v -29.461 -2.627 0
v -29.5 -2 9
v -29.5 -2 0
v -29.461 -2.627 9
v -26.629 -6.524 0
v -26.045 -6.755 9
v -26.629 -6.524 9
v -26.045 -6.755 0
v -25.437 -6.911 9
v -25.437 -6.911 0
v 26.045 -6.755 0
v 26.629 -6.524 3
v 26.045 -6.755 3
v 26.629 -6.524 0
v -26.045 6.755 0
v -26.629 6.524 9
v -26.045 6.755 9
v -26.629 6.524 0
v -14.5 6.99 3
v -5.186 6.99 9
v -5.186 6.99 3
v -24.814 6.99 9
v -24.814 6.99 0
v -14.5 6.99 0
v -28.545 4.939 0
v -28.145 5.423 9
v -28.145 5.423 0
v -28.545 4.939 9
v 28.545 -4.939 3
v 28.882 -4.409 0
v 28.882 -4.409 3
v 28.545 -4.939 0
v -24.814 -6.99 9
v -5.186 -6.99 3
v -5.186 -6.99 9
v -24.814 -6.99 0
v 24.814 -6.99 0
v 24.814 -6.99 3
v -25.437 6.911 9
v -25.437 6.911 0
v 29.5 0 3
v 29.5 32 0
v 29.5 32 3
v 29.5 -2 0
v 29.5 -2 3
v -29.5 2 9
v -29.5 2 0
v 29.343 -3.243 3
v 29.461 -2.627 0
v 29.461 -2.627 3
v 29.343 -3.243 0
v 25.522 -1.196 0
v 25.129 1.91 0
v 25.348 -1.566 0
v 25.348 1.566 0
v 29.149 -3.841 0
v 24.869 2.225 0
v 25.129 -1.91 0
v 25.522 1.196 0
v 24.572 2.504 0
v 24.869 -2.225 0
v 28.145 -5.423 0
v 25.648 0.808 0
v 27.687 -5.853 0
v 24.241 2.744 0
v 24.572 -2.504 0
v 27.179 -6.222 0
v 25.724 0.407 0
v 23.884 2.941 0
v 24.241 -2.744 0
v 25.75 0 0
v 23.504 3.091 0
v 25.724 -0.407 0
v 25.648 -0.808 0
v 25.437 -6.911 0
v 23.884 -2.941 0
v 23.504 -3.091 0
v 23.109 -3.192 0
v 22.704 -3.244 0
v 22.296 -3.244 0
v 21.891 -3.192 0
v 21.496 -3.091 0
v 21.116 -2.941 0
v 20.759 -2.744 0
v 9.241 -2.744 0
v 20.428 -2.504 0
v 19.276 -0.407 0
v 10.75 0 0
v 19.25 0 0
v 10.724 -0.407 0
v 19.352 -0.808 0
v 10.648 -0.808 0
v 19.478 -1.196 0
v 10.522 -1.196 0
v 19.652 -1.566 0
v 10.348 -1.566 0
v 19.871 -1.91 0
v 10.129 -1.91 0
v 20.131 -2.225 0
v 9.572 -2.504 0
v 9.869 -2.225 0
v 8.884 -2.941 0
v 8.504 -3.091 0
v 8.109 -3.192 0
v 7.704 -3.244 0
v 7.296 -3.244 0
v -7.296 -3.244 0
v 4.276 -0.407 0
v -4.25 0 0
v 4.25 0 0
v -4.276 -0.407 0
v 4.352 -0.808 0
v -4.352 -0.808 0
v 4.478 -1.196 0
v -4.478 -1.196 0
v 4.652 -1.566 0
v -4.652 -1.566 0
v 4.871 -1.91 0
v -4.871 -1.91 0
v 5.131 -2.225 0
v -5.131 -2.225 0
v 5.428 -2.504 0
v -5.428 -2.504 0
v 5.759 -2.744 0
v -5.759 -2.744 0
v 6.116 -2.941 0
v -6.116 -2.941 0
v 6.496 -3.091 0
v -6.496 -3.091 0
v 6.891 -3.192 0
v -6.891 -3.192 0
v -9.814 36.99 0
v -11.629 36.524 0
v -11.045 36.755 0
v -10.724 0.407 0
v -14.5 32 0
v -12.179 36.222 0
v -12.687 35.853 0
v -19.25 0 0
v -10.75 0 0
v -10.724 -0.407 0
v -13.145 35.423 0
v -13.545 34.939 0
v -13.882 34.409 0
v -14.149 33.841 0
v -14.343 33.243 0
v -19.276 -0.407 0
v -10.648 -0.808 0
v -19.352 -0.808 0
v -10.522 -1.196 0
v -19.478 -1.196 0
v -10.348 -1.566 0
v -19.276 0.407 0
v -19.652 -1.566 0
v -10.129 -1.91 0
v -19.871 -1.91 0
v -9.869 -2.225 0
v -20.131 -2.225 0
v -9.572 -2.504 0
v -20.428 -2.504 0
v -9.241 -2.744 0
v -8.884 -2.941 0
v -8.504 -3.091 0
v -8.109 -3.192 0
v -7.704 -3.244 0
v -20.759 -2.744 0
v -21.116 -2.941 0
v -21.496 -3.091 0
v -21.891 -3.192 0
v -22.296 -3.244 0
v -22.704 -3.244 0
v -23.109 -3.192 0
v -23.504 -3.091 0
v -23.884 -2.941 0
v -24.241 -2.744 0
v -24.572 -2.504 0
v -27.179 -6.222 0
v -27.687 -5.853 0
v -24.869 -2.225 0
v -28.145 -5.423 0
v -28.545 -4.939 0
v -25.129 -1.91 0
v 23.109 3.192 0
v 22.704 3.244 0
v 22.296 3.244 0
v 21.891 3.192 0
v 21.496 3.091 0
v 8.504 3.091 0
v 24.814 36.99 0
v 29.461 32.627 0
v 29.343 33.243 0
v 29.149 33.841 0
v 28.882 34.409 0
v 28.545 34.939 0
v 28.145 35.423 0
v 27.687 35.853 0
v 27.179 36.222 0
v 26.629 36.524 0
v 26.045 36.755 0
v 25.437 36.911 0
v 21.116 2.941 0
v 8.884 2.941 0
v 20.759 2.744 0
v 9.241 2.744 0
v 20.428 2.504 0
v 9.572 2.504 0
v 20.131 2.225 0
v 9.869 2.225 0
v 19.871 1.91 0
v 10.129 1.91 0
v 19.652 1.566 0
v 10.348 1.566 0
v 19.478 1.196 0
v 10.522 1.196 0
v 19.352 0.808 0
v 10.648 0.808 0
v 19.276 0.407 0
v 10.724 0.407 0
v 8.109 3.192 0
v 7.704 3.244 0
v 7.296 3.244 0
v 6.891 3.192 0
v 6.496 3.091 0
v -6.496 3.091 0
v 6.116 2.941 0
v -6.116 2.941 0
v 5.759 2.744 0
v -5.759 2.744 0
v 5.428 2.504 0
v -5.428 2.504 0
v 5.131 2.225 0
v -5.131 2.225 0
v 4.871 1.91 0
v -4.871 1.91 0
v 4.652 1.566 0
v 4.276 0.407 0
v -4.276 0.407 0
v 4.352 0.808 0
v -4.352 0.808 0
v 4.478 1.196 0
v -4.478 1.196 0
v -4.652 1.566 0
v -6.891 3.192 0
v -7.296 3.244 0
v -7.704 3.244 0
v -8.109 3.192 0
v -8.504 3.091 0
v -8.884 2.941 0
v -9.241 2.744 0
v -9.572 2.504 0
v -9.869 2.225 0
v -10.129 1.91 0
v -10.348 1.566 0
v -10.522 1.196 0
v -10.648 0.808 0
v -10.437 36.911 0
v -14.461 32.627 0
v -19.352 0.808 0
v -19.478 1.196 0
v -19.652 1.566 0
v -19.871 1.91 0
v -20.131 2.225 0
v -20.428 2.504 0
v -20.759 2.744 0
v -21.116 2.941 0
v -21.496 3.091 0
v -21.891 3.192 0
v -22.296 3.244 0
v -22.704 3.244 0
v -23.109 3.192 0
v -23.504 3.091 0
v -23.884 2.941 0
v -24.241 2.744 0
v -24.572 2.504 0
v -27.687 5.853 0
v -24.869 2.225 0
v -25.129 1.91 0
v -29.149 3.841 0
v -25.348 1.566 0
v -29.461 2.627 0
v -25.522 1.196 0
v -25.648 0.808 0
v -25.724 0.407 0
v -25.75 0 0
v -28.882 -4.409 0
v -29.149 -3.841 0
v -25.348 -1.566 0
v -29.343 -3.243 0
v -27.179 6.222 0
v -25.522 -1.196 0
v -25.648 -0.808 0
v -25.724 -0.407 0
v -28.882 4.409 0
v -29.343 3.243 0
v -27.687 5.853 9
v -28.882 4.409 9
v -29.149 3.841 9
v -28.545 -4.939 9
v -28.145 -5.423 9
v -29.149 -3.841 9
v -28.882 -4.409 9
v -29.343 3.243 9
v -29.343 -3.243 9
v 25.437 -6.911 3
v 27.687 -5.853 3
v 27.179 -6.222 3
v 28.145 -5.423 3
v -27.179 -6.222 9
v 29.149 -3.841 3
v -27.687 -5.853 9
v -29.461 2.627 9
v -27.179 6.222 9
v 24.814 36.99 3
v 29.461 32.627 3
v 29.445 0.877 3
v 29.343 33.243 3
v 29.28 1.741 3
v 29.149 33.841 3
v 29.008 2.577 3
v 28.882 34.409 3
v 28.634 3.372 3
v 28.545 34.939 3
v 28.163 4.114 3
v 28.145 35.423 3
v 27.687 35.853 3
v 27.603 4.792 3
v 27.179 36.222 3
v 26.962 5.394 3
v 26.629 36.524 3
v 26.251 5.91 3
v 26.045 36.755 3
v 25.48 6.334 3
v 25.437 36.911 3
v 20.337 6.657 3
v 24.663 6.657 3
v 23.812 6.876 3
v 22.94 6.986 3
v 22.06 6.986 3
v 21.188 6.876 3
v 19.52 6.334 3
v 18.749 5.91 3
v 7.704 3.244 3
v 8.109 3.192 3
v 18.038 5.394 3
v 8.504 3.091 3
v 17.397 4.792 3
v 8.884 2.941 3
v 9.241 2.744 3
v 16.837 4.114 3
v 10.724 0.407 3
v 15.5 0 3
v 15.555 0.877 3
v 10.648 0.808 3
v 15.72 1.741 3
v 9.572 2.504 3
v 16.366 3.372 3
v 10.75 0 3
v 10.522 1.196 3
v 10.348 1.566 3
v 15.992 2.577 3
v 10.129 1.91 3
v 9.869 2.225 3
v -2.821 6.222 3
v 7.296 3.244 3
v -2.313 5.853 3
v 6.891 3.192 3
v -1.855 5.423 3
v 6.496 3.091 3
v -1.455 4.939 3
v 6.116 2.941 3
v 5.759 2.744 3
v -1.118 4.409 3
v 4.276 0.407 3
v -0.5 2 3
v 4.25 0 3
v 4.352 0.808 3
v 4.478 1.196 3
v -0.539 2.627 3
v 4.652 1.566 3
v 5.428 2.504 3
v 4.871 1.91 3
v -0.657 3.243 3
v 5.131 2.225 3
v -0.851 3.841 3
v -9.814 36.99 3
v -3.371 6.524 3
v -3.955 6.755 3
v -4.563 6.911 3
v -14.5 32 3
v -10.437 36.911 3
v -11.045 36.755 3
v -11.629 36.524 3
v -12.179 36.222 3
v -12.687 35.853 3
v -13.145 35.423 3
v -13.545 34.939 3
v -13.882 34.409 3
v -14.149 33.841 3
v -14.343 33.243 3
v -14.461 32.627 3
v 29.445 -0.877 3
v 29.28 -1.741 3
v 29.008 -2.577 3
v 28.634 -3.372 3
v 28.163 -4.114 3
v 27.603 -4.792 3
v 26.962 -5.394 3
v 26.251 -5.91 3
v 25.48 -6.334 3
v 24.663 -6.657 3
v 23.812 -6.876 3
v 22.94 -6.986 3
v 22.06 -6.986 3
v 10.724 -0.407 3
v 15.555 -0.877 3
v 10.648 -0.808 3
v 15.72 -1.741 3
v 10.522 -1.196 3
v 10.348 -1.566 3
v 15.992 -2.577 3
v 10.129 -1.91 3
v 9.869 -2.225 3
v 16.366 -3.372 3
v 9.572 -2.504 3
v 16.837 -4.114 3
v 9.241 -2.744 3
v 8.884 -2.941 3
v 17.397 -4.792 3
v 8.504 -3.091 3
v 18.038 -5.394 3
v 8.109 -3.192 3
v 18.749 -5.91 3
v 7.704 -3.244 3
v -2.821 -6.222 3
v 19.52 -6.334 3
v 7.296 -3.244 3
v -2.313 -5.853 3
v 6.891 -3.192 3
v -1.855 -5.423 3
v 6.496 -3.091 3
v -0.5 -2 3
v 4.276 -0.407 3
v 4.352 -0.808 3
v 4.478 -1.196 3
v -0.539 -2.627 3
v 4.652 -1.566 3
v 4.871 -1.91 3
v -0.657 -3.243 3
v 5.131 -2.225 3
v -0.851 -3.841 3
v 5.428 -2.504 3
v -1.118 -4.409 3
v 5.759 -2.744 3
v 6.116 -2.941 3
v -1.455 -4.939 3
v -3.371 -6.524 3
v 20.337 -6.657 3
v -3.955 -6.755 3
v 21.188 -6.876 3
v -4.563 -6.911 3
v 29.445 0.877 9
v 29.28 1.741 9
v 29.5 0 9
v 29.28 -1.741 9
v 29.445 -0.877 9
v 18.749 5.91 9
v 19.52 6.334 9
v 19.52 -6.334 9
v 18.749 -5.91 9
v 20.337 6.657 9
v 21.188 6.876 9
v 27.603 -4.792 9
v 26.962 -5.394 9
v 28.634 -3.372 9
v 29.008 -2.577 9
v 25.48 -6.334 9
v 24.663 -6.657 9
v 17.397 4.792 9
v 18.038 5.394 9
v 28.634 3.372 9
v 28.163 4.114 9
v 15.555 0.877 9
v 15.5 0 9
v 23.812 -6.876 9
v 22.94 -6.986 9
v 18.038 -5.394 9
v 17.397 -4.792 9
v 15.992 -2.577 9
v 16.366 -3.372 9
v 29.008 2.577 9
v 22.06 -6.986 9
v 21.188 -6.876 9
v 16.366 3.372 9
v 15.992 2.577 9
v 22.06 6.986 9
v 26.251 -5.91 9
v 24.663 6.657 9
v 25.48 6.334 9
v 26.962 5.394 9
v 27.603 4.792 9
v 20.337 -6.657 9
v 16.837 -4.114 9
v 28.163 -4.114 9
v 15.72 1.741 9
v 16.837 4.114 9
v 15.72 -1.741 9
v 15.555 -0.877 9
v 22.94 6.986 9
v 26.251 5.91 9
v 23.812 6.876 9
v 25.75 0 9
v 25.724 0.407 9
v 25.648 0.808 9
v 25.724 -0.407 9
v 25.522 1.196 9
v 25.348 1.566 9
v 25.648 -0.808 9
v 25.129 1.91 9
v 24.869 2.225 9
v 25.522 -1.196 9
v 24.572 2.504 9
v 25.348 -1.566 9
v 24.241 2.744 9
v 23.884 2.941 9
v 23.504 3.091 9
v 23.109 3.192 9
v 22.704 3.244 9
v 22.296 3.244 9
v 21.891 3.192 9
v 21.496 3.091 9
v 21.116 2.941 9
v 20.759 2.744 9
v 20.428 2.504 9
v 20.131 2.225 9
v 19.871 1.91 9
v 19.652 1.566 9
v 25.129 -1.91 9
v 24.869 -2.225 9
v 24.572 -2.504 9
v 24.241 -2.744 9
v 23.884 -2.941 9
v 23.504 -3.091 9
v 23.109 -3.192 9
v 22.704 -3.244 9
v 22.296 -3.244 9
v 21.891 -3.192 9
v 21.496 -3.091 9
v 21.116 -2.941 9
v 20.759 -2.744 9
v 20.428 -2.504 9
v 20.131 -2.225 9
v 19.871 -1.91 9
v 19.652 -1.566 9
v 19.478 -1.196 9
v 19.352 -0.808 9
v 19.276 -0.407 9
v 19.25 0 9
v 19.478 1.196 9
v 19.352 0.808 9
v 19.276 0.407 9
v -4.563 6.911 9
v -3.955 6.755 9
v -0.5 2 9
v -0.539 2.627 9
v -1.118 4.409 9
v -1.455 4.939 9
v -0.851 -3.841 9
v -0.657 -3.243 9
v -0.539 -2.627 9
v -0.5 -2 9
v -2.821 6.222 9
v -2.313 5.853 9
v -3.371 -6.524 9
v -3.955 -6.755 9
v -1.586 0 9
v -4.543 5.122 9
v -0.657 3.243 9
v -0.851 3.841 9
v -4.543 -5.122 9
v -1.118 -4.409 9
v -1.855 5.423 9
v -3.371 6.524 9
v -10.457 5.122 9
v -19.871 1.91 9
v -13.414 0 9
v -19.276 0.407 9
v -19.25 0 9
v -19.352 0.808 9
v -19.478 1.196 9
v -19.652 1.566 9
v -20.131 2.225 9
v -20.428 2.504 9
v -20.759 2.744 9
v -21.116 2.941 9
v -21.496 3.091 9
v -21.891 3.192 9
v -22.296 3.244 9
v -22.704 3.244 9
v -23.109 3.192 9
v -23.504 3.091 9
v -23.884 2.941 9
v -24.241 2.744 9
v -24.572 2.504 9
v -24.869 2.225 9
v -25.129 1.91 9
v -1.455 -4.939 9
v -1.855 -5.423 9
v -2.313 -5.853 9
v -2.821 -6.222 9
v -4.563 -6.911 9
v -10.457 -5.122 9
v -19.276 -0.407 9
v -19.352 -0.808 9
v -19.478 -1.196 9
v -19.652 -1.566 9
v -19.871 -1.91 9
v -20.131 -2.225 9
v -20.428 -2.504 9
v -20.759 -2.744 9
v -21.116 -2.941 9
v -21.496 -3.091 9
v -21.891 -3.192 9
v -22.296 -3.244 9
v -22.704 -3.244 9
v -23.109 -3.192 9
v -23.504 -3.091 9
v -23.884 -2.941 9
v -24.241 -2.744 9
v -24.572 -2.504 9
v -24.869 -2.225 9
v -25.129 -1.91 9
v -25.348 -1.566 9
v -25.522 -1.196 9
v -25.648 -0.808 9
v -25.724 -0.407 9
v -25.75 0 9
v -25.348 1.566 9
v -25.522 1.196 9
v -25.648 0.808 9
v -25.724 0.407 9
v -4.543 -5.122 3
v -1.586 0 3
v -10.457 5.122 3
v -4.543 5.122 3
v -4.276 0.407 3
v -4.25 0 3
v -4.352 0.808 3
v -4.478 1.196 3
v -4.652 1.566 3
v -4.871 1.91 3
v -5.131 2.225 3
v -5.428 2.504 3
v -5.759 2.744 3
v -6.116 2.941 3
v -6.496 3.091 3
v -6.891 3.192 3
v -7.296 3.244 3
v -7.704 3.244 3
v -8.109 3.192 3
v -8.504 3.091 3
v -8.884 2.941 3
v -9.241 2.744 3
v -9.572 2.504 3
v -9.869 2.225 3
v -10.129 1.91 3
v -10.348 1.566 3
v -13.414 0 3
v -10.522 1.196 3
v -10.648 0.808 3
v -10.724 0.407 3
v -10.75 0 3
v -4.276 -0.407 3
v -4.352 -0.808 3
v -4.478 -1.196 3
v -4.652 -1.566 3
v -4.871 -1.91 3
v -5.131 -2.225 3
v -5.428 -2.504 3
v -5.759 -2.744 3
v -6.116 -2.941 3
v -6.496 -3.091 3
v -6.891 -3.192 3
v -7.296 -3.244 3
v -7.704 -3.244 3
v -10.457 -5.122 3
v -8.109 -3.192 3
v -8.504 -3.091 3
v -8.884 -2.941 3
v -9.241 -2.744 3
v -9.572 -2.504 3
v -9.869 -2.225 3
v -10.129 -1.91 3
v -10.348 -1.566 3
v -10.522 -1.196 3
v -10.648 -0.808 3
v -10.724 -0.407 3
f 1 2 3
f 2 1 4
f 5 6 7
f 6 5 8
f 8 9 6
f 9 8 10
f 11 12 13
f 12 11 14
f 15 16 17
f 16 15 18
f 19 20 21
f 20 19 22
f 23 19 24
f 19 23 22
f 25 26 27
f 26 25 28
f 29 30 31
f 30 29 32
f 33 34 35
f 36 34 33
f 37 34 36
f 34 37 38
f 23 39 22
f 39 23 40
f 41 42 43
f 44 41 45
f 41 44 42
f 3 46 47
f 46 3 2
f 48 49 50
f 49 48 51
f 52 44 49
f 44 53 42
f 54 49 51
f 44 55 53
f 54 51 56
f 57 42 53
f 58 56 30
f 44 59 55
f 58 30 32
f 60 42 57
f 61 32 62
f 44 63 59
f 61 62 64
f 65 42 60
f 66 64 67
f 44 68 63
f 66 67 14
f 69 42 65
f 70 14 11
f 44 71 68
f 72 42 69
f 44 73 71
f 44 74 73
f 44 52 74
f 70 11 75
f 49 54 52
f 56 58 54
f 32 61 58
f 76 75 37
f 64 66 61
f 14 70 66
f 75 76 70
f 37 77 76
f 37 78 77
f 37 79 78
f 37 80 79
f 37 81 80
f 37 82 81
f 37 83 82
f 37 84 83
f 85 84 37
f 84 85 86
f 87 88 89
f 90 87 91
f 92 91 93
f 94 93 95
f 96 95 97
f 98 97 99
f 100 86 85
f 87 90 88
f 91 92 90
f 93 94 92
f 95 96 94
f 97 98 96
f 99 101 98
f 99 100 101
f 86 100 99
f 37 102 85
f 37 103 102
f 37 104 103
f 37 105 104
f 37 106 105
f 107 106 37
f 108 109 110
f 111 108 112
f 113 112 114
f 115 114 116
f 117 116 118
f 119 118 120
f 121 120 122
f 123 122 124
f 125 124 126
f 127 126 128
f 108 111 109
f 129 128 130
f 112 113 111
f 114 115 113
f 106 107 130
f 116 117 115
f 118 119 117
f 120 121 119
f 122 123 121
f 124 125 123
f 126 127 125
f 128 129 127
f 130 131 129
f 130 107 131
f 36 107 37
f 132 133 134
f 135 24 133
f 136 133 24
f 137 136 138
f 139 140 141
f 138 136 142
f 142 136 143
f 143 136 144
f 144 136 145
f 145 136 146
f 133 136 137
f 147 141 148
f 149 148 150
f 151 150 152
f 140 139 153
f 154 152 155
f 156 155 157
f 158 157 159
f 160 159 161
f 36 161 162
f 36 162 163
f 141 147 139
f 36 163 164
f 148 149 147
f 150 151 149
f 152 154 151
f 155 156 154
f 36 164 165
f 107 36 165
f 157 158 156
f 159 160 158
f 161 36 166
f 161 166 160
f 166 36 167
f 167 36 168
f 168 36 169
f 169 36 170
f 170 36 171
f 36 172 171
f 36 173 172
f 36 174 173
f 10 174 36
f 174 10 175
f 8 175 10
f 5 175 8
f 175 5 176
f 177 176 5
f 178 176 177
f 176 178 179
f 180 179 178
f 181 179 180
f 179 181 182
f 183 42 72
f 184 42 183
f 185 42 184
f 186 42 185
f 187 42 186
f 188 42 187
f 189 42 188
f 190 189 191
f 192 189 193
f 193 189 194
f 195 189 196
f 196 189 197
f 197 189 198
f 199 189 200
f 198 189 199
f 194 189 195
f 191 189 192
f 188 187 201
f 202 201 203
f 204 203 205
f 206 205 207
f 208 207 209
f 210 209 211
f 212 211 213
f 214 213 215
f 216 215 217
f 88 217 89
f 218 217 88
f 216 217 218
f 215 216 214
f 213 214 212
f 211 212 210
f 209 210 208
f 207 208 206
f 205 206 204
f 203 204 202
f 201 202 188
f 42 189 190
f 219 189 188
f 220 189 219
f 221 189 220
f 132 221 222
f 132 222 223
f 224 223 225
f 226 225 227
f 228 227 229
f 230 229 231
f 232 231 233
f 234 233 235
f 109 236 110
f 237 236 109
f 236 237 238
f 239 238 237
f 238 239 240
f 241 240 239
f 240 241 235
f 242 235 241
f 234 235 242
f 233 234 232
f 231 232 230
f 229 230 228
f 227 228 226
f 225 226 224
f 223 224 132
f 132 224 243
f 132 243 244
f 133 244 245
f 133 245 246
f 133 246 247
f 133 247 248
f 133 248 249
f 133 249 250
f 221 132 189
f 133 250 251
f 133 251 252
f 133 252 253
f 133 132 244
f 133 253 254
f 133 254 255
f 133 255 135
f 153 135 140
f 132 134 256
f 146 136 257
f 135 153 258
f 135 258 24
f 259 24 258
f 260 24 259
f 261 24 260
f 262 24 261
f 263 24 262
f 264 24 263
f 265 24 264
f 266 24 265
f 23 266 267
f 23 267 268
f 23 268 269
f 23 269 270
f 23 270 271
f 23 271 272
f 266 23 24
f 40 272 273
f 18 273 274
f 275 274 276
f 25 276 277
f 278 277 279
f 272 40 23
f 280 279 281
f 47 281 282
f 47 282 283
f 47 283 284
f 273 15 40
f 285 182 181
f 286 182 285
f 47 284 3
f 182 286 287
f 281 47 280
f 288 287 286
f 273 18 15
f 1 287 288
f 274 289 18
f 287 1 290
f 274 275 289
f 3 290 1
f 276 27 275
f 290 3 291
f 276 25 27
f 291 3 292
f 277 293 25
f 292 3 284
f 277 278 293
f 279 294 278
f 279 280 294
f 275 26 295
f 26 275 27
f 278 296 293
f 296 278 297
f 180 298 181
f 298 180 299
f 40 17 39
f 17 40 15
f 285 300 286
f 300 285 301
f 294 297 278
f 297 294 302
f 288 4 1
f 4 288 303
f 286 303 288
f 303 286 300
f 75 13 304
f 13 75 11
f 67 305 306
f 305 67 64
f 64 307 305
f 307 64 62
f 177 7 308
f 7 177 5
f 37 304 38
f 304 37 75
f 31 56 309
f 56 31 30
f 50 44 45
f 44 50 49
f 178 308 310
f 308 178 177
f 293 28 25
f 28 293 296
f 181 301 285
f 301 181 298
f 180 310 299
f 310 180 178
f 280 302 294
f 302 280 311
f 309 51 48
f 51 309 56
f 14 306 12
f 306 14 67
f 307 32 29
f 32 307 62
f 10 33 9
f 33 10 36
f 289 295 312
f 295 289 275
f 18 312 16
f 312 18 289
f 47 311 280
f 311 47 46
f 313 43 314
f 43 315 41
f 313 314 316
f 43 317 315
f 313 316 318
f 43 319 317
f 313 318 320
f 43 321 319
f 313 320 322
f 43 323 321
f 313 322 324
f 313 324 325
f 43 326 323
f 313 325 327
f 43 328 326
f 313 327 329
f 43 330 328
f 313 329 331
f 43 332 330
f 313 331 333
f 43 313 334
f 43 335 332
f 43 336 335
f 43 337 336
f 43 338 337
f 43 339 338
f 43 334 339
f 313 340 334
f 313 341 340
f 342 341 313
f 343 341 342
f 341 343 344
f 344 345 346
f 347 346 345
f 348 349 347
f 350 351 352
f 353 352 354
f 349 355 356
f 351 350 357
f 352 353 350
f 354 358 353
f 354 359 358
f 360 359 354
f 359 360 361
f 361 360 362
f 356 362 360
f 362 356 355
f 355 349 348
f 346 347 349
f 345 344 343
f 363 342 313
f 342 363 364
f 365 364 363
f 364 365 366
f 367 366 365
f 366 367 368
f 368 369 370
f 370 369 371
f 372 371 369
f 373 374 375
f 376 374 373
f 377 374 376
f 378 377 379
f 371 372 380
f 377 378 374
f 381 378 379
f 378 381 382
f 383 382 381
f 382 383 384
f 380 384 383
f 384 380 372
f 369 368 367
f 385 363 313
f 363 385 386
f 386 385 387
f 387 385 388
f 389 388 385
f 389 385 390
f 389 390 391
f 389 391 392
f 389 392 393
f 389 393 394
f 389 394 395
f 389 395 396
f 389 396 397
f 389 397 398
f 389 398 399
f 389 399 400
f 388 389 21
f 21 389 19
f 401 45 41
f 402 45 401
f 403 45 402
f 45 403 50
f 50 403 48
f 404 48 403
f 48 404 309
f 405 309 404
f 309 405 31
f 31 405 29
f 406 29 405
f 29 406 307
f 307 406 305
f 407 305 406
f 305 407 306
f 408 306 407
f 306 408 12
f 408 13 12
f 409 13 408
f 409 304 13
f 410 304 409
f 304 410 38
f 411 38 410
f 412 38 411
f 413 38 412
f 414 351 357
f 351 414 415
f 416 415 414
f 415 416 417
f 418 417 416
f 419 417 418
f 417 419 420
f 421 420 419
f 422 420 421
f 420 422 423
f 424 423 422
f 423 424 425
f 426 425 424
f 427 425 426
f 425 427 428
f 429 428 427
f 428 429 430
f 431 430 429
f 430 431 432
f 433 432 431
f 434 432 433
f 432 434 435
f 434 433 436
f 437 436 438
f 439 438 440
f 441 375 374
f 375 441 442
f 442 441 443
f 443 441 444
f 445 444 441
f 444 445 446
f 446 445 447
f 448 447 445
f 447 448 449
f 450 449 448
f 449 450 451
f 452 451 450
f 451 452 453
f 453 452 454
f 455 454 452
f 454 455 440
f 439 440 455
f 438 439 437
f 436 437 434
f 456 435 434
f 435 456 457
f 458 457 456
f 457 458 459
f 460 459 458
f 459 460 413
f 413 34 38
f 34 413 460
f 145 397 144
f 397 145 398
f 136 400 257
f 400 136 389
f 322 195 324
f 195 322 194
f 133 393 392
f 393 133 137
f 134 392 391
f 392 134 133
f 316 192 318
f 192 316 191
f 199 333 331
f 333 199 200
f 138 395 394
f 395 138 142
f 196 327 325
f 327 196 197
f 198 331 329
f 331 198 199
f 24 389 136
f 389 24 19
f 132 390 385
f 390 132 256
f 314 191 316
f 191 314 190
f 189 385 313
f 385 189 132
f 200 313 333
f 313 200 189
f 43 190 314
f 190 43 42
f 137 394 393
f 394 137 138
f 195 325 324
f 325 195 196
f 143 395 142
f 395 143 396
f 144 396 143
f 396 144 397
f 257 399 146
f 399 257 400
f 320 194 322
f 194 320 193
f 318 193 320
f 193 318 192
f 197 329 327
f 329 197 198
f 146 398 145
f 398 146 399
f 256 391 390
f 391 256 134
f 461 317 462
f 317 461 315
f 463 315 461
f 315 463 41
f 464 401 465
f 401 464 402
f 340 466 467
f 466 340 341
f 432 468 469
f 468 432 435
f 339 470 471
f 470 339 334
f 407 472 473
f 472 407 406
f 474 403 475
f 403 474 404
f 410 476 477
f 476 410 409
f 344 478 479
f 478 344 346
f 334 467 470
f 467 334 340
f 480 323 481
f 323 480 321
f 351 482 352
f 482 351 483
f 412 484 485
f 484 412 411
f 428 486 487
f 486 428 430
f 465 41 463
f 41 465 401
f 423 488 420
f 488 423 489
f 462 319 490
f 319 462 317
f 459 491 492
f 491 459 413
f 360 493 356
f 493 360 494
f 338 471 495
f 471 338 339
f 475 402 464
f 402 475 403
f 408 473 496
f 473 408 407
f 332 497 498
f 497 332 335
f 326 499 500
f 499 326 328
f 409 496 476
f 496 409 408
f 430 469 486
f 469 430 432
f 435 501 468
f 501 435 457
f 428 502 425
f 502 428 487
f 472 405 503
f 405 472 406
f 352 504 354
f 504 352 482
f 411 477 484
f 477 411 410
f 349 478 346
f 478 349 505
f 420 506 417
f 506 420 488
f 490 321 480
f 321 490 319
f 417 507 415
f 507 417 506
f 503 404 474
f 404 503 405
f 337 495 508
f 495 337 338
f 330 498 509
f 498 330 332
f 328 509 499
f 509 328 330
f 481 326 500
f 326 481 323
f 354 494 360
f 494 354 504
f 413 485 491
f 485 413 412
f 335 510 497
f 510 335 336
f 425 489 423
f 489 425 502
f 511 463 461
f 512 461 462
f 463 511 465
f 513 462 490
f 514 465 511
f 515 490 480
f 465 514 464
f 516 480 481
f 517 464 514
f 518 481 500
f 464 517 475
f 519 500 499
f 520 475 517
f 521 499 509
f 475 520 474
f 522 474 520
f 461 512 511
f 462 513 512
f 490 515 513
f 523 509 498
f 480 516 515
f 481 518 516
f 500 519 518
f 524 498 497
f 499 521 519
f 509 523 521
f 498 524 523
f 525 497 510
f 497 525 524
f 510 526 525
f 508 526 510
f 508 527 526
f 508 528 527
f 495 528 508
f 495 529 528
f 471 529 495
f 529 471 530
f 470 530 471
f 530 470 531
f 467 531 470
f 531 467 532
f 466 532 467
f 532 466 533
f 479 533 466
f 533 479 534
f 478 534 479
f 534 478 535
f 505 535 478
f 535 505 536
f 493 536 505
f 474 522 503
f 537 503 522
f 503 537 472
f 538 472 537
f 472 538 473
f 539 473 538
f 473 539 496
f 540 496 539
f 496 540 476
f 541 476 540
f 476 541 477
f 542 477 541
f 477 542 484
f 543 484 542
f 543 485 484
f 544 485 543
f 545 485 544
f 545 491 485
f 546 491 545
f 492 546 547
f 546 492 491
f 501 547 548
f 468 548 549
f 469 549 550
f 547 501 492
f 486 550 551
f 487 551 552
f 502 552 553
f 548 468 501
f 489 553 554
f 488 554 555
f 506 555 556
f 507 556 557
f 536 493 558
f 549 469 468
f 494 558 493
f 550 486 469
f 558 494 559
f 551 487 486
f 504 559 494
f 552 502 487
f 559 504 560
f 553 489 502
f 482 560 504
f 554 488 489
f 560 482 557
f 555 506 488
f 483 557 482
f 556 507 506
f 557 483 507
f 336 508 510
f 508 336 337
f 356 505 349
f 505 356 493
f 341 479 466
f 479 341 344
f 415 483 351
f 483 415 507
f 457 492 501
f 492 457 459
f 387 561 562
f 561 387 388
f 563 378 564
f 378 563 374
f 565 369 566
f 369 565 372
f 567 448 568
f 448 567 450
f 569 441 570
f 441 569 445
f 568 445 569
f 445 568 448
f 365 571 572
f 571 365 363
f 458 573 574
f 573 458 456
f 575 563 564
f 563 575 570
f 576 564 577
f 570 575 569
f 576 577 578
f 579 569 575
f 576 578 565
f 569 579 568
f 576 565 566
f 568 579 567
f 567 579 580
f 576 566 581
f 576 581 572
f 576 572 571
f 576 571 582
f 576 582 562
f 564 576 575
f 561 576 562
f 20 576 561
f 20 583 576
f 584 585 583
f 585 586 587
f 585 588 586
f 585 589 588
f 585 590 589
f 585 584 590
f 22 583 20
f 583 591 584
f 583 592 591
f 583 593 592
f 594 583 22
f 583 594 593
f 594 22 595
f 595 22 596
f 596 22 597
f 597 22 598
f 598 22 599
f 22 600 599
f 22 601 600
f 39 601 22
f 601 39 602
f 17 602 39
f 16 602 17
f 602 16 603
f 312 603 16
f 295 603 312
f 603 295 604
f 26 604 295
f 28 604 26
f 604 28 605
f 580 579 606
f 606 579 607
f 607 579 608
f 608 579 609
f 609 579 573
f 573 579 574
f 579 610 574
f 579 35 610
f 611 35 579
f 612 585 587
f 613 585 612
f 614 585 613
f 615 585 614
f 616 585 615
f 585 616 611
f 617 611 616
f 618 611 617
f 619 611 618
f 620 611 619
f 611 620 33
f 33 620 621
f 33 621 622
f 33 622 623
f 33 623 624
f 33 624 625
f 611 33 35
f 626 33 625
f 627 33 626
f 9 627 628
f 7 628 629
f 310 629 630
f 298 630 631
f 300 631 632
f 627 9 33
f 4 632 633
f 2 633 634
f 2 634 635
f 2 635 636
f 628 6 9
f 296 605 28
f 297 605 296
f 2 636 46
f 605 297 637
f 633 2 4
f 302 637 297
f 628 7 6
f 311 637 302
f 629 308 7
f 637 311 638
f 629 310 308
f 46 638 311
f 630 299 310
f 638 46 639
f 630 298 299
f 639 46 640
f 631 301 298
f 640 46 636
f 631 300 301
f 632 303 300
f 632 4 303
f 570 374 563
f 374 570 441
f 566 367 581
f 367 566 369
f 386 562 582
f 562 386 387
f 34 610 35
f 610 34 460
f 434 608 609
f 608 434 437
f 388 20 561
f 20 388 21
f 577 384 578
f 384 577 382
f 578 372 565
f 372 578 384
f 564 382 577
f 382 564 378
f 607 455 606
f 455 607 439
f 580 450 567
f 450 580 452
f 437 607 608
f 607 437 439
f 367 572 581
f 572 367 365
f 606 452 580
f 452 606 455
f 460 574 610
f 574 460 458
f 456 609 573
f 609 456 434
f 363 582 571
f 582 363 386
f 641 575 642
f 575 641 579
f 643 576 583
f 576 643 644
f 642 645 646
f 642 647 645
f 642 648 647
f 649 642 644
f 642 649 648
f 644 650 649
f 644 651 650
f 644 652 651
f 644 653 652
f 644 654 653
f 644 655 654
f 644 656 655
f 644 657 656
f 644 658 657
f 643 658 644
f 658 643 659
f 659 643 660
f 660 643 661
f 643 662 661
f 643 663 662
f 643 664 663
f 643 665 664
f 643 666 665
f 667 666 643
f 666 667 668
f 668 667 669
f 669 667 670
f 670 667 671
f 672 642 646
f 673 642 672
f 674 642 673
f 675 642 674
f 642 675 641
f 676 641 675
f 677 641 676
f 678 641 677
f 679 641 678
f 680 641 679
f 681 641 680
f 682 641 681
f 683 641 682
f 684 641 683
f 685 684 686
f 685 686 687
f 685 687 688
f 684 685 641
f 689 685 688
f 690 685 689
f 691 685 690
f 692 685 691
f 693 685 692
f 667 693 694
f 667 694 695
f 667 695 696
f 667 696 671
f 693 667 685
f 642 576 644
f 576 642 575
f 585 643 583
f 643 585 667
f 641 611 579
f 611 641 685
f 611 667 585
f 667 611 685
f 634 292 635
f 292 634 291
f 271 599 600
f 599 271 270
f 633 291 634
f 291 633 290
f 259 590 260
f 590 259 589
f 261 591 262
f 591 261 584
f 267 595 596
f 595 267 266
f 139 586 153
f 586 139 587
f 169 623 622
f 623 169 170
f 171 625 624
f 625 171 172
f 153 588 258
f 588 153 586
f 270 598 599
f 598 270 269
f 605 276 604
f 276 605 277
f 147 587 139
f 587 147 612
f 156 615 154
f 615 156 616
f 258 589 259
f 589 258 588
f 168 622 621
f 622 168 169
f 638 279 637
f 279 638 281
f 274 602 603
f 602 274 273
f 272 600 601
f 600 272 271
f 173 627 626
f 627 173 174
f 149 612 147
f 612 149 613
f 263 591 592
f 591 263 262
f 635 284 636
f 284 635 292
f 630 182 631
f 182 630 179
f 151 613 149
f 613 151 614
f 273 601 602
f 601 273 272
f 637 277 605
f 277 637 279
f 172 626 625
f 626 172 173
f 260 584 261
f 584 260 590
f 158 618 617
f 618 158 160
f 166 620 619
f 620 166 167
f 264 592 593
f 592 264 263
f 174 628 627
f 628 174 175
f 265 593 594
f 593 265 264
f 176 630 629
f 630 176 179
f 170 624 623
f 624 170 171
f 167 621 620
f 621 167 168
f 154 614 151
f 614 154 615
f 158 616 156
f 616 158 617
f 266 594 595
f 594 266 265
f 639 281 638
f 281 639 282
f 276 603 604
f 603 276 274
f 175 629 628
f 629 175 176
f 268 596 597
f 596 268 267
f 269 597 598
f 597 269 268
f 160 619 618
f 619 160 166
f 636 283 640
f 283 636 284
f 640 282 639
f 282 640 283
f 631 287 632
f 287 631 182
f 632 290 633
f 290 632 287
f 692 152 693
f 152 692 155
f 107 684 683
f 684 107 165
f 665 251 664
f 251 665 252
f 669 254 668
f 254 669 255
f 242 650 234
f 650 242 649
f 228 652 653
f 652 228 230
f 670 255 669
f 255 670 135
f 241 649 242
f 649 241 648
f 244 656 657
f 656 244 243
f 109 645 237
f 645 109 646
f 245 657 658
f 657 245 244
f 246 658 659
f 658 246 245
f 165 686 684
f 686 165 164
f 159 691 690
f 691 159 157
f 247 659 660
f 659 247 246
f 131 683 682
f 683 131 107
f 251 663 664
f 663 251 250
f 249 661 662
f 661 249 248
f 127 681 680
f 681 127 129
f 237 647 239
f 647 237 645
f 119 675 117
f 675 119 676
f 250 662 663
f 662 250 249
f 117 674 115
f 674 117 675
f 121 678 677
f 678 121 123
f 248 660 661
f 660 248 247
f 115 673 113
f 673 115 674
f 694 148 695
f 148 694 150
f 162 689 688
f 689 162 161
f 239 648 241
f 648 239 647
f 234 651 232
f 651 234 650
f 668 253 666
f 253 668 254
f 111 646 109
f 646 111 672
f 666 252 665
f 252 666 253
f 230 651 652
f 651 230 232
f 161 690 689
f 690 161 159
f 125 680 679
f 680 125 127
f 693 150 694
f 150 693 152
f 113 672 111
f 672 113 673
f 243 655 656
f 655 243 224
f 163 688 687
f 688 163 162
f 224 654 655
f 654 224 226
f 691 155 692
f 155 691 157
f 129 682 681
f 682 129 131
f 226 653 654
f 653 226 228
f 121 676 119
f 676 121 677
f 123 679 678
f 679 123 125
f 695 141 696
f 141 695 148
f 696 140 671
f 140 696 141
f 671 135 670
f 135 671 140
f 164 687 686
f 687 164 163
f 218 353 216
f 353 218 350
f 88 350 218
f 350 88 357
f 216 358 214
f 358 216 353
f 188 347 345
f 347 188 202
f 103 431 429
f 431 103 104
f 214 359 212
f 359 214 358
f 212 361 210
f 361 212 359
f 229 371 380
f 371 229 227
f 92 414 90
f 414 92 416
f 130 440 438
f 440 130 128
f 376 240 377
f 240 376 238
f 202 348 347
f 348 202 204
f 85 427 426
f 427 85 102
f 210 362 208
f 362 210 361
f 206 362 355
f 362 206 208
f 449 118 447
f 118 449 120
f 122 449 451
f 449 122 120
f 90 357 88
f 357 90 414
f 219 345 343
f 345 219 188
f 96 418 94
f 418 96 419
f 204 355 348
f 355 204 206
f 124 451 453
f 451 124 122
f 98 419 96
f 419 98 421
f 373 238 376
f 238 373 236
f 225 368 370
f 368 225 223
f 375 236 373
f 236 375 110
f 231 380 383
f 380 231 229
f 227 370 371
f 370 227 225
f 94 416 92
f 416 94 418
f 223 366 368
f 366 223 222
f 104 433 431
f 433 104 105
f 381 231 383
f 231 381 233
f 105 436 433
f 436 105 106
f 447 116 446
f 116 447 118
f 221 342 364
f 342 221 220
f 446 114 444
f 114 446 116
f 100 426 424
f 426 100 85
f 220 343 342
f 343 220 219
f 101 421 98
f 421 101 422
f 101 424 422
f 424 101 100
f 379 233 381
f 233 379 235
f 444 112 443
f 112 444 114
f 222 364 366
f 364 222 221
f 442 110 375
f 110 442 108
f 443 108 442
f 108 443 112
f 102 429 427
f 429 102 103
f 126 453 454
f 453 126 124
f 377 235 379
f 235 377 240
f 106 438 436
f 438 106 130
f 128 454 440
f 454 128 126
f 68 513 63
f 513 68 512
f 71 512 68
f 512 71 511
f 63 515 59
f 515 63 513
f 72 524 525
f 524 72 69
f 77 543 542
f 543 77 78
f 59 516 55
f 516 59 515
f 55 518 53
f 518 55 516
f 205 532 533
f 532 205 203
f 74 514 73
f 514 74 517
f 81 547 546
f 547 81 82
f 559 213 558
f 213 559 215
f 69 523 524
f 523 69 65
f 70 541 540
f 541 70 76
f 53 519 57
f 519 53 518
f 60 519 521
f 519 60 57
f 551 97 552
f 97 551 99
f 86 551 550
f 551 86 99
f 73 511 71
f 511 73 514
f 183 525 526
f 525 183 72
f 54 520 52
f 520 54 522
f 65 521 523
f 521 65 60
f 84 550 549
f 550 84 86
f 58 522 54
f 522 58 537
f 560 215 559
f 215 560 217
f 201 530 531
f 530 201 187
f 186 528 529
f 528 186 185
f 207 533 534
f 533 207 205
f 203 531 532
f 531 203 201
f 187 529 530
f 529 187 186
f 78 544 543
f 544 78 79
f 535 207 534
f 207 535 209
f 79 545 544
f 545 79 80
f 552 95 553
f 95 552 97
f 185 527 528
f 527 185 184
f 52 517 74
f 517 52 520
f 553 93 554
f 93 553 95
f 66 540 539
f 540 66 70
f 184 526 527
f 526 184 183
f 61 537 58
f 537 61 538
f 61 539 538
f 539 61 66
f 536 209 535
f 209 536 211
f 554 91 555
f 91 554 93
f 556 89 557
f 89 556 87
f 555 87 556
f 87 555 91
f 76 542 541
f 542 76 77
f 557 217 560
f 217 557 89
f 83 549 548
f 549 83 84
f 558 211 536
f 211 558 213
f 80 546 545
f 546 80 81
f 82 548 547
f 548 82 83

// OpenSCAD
$fn = 50;


difference() {
	union() {
		hull() {
			translate(v = [-24.5000000000, 2.0000000000, 0]) {
				cylinder(h = 3, r = 5);
			}
			translate(v = [24.5000000000, 2.0000000000, 0]) {
				cylinder(h = 3, r = 5);
			}
			translate(v = [-24.5000000000, -2.0000000000, 0]) {
				cylinder(h = 3, r = 5);
			}
			translate(v = [24.5000000000, -2.0000000000, 0]) {
				cylinder(h = 3, r = 5);
			}
		}
		translate(v = [7.5000000000, 15.0000000000, 0]) {
			hull() {
				translate(v = [-17.0000000000, 17.0000000000, 0]) {
					cylinder(h = 3, r = 5);
				}
				translate(v = [17.0000000000, 17.0000000000, 0]) {
					cylinder(h = 3, r = 5);
				}
				translate(v = [-17.0000000000, -17.0000000000, 0]) {
					cylinder(h = 3, r = 5);
				}
				translate(v = [17.0000000000, -17.0000000000, 0]) {
					cylinder(h = 3, r = 5);
				}
			}
		}
		translate(v = [22.5000000000, 0, 0]) {
			cylinder(h = 9, r = 7.0000000000);
		}
		translate(v = [-15.0000000000, 0, 0]) {
			hull() {
				translate(v = [-9.5000000000, 2.0000000000, 0]) {
					cylinder(h = 9, r = 5);
				}
				translate(v = [9.5000000000, 2.0000000000, 0]) {
					cylinder(h = 9, r = 5);
				}
				translate(v = [-9.5000000000, -2.0000000000, 0]) {
					cylinder(h = 9, r = 5);
				}
				translate(v = [9.5000000000, -2.0000000000, 0]) {
					cylinder(h = 9, r = 5);
				}
			}
		}
	}
	union() {
		translate(v = [-7.5000000000, 0, 9]) {
			rotate(a = [0, 0, 0]) {
				difference() {
					union() {
						translate(v = [0, 0, -6]) {
							linear_extrude(height = 6) {
								polygon(points = [[5.9142500000, 0.0000000000], [2.9571250000, 5.1218907443], [-2.9571250000, 5.1218907443], [-5.9142500000, 0.0000000000], [-2.9571250000, -5.1218907443], [2.9571250000, -5.1218907443]]);
							}
						}
					}
					union();
				}
			}
		}
		translate(v = [-22.5000000000, 0.0000000000, 0]) {
			translate(v = [0, 0, -100]) {
				cylinder(h = 200, r = 3.2500000000);
			}
		}
		translate(v = [-7.5000000000, 0.0000000000, 0]) {
			translate(v = [0, 0, -100]) {
				cylinder(h = 200, r = 3.2500000000);
			}
		}
		translate(v = [7.5000000000, 0.0000000000, 0]) {
			translate(v = [0, 0, -100]) {
				cylinder(h = 200, r = 3.2500000000);
			}
		}
		translate(v = [22.5000000000, 0.0000000000, 0]) {
			translate(v = [0, 0, -100]) {
				cylinder(h = 200, r = 3.2500000000);
			}
		}
	}
}
